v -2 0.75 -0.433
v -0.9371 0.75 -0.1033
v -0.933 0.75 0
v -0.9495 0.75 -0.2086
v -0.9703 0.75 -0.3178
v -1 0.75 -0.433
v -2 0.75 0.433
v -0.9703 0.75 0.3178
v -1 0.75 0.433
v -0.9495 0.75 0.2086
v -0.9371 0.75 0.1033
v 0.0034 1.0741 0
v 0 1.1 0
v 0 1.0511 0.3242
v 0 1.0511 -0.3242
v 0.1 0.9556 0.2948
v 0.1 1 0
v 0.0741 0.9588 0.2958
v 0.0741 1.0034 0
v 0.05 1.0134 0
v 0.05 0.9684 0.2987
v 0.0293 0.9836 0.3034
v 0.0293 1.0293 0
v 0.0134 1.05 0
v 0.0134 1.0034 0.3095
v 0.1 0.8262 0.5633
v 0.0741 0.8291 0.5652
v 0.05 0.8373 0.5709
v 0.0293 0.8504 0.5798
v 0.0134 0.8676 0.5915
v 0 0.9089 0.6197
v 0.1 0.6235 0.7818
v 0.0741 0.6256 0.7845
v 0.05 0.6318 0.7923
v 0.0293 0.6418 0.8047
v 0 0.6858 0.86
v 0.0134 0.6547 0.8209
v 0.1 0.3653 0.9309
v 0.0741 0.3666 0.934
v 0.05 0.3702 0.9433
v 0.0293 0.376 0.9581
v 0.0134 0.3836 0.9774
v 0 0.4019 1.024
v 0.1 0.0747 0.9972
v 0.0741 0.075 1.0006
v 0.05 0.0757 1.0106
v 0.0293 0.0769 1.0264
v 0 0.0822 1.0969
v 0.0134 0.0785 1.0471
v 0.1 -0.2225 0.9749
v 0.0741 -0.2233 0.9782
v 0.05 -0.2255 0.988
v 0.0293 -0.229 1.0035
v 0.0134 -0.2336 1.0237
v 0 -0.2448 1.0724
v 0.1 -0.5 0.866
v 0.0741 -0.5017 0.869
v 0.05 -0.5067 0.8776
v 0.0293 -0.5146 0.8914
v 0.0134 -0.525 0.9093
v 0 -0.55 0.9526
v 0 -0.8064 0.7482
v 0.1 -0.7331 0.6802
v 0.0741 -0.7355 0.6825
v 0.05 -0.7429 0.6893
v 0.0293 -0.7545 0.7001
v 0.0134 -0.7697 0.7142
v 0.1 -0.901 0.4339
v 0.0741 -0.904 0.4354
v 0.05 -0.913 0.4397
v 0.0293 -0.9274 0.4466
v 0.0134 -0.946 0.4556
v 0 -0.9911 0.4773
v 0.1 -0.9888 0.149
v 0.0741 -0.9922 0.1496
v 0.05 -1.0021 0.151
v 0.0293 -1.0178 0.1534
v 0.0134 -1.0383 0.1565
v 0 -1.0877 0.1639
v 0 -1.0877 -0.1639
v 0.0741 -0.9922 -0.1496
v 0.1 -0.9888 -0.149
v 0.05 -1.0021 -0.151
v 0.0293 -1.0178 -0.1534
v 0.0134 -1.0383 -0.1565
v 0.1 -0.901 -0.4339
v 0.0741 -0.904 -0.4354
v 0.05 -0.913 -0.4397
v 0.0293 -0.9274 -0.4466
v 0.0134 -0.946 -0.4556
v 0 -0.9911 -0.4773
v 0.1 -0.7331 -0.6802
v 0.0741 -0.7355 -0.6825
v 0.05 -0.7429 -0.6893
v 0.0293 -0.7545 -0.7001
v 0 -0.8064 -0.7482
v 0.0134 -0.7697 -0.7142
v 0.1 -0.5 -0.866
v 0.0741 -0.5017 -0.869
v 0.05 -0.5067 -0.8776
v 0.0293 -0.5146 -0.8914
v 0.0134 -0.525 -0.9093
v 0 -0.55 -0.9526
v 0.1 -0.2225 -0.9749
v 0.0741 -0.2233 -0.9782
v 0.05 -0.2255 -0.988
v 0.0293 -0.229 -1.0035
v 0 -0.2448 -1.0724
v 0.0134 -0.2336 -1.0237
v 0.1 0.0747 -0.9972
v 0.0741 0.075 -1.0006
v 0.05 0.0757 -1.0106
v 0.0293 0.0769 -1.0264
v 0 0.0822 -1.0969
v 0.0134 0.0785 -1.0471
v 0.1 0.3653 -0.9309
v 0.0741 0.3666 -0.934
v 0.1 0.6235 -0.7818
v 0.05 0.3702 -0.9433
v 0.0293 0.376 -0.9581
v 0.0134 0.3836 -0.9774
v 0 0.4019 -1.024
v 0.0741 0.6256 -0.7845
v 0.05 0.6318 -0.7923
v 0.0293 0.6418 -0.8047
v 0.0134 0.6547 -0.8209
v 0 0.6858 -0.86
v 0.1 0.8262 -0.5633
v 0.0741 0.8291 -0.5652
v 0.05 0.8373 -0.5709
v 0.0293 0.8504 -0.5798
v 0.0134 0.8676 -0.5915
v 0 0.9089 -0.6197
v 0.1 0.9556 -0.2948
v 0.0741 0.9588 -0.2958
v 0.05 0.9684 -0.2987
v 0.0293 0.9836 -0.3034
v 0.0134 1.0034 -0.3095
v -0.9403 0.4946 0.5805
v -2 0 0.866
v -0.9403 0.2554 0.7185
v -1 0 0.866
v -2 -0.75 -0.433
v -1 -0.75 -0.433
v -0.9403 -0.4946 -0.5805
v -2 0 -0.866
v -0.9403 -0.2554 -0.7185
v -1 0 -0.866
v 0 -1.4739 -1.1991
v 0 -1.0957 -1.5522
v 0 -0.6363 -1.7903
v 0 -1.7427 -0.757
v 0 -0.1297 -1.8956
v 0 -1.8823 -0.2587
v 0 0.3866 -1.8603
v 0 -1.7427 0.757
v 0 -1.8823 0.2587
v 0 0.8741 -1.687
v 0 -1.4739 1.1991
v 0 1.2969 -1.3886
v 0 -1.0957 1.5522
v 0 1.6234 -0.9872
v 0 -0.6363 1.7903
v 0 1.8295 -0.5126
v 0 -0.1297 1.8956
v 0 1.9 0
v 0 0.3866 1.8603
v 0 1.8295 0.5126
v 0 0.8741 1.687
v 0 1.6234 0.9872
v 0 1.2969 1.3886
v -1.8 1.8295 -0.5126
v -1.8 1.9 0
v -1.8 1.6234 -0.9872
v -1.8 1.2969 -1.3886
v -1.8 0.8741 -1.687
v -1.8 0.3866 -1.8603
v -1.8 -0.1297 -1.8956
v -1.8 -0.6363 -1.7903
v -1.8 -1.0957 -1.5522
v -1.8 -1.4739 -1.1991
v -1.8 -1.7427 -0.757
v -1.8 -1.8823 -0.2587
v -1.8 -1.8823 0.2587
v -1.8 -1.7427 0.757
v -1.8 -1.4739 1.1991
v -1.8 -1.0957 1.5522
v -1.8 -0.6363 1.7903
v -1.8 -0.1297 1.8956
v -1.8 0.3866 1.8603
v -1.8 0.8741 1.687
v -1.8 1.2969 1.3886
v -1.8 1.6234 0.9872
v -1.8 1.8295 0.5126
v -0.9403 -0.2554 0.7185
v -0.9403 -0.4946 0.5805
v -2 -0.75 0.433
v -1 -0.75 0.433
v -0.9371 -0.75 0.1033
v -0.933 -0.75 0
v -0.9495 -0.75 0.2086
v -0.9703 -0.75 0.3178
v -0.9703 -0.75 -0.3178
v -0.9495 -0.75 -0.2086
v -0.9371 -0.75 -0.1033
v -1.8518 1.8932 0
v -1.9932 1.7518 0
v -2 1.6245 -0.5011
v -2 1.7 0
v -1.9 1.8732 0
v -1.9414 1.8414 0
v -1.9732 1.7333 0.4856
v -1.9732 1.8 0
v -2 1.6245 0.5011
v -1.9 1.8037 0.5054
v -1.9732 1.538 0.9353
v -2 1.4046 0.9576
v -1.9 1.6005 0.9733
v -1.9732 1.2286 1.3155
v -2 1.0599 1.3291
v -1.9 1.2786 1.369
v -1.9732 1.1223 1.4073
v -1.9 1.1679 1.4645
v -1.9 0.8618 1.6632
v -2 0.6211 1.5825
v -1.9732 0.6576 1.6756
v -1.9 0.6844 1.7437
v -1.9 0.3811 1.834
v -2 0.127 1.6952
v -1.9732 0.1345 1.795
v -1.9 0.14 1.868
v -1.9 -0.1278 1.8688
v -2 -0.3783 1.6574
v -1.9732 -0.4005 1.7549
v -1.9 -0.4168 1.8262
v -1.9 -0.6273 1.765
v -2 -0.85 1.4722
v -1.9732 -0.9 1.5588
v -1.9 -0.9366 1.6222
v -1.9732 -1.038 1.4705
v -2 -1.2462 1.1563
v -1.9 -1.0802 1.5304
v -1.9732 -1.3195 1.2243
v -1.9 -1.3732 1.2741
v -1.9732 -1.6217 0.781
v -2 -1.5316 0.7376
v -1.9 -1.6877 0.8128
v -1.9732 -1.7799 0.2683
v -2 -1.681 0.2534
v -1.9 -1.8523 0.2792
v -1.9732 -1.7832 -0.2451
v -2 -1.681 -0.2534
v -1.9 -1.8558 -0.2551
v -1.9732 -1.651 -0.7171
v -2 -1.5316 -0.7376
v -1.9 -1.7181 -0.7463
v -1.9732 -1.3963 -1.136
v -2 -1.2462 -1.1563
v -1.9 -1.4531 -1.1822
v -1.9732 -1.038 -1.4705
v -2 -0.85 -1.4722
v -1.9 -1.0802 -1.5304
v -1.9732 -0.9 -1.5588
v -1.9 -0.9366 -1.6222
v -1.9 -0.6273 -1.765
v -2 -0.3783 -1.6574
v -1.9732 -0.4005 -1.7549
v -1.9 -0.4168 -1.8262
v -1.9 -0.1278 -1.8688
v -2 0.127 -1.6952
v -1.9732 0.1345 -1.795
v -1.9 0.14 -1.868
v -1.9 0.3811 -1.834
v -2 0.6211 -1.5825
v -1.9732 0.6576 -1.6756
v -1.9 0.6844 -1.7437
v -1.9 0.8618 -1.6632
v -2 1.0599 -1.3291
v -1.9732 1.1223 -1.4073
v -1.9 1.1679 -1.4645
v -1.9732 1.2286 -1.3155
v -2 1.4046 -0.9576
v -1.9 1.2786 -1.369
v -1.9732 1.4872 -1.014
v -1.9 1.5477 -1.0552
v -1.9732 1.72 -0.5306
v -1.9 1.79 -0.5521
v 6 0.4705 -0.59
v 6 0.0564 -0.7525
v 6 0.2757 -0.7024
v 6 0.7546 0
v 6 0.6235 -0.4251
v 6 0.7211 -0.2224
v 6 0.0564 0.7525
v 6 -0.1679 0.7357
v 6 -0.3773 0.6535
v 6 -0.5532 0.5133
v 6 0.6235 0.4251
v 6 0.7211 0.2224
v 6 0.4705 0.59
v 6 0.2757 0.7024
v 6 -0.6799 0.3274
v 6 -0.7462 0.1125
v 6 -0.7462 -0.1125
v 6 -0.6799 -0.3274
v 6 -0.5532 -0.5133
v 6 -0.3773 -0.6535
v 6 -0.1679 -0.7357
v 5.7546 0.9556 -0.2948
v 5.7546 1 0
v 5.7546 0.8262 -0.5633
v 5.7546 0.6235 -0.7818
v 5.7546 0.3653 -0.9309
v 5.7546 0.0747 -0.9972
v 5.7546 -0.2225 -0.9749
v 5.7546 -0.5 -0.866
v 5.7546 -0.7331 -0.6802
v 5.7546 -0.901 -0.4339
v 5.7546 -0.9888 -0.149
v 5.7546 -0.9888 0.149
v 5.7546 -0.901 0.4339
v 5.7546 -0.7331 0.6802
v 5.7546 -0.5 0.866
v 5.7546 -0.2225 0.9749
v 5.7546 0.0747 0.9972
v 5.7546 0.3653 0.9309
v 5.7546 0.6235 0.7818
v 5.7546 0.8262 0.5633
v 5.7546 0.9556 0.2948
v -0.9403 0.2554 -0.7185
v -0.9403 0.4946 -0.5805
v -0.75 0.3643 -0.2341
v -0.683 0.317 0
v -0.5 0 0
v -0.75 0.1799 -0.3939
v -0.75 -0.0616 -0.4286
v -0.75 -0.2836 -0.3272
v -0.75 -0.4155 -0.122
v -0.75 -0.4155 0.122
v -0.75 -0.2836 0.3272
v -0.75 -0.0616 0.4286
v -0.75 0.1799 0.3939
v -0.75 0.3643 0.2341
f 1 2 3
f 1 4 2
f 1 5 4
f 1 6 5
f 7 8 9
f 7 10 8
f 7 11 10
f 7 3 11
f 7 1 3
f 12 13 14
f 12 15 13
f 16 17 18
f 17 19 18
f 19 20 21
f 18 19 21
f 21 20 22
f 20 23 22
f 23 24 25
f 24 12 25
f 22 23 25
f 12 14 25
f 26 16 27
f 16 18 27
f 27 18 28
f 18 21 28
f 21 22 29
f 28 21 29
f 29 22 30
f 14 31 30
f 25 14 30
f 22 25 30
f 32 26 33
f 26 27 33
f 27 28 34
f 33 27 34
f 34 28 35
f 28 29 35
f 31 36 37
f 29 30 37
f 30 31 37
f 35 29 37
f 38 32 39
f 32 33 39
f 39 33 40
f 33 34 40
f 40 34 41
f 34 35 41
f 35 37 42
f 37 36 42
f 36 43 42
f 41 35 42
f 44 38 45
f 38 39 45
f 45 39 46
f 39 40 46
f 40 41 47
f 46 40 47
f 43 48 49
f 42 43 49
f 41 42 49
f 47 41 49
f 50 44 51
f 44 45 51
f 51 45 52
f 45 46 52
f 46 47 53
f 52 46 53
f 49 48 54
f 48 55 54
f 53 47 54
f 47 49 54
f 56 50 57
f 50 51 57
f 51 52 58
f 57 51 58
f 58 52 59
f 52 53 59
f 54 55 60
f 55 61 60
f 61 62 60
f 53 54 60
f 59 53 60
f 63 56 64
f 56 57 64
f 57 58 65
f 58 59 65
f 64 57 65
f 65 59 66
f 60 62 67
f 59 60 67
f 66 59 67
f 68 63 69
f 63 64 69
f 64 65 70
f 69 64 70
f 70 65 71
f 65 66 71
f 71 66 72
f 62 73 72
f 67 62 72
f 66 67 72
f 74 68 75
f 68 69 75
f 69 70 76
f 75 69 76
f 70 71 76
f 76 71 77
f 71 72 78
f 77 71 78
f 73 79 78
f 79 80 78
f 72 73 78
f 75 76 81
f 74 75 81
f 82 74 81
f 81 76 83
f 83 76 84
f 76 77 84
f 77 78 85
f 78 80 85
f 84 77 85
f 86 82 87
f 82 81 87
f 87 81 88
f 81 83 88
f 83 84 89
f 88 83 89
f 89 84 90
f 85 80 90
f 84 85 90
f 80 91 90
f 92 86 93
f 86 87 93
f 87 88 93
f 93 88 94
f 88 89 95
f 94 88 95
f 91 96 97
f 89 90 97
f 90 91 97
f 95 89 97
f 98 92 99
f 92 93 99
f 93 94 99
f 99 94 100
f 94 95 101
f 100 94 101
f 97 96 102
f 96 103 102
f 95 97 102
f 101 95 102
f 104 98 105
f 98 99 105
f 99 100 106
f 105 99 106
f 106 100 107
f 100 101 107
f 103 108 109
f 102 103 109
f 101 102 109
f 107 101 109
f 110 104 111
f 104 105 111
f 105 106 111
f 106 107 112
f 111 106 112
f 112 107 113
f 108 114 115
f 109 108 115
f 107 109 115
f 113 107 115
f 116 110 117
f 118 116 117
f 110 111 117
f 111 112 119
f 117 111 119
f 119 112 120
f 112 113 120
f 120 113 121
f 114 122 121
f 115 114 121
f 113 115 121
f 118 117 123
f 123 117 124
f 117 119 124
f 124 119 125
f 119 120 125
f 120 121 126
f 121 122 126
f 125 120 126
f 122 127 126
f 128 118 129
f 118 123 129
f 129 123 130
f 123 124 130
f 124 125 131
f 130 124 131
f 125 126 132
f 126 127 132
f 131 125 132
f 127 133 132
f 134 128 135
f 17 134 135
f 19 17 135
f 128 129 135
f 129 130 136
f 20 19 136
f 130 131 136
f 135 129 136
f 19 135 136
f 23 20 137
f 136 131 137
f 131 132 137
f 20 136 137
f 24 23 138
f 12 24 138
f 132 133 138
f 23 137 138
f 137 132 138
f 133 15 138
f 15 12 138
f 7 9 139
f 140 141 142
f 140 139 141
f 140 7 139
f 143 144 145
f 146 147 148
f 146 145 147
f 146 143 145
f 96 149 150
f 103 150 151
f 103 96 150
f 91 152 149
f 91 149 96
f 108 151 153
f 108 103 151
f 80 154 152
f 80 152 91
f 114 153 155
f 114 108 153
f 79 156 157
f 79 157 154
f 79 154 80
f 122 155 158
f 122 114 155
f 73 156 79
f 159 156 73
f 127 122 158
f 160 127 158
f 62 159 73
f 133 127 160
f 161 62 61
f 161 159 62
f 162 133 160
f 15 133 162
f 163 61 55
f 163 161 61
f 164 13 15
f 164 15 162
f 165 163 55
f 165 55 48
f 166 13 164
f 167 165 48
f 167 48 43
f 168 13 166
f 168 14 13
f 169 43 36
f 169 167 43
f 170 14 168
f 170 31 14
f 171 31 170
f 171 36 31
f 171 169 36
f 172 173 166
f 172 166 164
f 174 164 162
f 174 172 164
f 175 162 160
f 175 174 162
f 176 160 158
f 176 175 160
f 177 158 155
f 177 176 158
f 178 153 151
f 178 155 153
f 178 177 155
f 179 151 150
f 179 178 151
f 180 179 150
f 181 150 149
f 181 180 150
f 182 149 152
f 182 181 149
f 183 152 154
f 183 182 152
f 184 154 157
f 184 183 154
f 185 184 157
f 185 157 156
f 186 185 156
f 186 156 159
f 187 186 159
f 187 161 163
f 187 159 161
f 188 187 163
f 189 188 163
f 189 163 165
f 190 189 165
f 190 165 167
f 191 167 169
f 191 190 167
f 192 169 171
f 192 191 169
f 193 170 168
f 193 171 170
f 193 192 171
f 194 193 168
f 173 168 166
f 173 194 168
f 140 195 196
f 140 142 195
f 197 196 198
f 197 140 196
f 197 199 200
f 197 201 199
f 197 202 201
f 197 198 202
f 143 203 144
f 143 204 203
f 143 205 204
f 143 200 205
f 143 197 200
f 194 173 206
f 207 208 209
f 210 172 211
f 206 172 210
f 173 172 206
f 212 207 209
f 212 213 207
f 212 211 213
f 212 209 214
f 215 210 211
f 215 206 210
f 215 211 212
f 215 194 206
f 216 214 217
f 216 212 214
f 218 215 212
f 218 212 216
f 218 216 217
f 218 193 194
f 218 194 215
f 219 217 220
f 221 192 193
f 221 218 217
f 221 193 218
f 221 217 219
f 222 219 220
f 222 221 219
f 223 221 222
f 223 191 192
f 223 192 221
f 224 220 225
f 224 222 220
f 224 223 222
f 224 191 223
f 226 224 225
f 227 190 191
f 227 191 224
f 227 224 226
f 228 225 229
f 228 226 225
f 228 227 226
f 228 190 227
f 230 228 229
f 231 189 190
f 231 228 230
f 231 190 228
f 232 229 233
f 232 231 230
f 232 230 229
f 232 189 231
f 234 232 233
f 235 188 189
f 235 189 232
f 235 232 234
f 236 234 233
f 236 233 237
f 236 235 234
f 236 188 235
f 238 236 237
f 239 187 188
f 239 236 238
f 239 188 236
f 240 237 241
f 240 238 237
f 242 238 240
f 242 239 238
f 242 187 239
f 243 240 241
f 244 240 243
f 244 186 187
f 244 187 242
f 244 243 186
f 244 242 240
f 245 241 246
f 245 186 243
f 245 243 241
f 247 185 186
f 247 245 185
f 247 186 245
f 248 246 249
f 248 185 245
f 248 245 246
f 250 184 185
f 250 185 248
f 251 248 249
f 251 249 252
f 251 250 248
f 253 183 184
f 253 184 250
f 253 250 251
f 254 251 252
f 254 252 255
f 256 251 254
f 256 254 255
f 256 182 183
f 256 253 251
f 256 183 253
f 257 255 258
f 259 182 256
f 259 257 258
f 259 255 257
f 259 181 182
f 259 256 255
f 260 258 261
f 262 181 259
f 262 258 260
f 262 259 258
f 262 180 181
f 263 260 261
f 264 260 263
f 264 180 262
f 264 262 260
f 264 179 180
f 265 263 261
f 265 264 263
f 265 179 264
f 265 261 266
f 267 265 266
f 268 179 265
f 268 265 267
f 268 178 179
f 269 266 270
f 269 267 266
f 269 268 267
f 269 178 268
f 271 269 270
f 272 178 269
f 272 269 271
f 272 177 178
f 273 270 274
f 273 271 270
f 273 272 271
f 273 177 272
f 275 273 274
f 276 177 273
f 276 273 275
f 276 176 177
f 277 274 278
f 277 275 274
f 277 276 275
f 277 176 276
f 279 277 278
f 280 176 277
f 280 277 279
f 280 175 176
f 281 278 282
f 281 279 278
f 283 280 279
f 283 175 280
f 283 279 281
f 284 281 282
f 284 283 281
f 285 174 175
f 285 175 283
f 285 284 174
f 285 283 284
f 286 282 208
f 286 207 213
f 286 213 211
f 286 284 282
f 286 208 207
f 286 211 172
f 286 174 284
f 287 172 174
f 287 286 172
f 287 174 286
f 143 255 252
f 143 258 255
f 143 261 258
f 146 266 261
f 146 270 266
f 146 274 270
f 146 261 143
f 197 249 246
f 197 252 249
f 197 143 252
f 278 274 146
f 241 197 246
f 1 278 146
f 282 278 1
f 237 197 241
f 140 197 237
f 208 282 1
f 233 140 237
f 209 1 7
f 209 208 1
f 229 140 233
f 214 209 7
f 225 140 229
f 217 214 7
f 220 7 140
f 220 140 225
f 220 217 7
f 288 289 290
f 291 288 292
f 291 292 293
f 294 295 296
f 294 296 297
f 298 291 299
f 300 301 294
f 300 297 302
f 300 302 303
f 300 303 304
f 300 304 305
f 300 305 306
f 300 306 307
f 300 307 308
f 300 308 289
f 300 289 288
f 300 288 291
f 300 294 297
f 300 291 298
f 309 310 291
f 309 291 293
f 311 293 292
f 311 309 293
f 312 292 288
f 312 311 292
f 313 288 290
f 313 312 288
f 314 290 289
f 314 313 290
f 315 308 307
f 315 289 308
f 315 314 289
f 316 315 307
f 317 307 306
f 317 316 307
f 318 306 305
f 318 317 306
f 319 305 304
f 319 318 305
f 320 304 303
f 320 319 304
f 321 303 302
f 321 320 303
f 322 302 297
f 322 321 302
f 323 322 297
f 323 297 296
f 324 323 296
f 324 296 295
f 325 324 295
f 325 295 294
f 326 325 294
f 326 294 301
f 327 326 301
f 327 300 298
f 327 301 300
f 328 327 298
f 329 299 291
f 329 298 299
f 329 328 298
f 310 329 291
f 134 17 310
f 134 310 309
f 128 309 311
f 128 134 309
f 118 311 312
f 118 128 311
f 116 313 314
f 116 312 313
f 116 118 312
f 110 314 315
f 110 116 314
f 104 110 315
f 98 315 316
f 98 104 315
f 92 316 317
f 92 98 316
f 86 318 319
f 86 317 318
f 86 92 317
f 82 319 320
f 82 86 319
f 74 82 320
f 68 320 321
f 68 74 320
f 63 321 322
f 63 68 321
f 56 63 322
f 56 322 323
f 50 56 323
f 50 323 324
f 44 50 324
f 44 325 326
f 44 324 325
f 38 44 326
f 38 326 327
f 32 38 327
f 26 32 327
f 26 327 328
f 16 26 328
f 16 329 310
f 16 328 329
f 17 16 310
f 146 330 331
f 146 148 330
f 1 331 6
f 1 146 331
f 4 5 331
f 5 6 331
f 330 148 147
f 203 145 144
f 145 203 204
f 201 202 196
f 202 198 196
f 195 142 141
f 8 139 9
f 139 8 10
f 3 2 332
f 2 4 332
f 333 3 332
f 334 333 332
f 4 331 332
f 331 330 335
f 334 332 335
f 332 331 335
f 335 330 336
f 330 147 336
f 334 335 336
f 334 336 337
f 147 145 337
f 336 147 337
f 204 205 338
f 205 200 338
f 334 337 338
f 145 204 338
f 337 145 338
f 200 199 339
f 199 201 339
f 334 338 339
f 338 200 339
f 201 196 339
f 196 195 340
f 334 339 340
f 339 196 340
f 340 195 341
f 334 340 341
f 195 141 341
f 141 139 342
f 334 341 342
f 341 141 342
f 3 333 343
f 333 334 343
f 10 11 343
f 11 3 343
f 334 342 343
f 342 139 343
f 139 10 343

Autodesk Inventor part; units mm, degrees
ref_plane "YZ Plane" through (0, 0, 0) normal (1, 0, 0) x (0, 1, 0)
ref_plane "XZ Plane" through (0, 0, 0) normal (0, 1, 0) x (-1, 0, 0)
sketch "Sketch1" plane through (0, 0, 0) normal (0, 0, 1) x (1, 0, 0)
  line L0 (-0.5, 0) -> (6, 0)
  line L1 (6, 0) -> (6, 1)
  line L2 (6, 1) -> (1, 1)
  line L3 (1, 1) -> (0.7545, 1)
  line L4 (0.7545, 1) -> (0, 1)
  line L5 (0, 1) -> (0, 1.9)
  line L6 (0, 1.9) -> (-2, 1.9)
  line L7 (-2, 1.9) -> (-2, 0.866)
  line L8 (-2, 0.866) -> (-1, 0.866)
  line L9 (-1, 0.866) -> (-0.5, 0)
  line L10 (-3.6, 0) -> (7.6, 0) projected
  line L11 (0, -0.38) -> (0, 2.28) projected
  line L12 (1, 1) -> (0, 1) construction
  dimension "d1" = 5
  dimension "d2" = 0.2455
  dimension "d3" = 2
  dimension "d4" = 1
  dimension "d5" = 60
  dimension "d6" = 2
  dimension "d7" = 2
  dimension "d8" = 1.7321
  dimension "d9" = 3.8
  dimension "d26" = 6
revolve "Body" add sketch "Sketch1" angle 360 about axis through (-0.5, 0, 0) along (1, 0, 0)
sketch "Sketch2" plane through (-2, 0, 0) normal (-1, 0, 0) x (0, 0, 1)
  circle A0 centre (0, 0) radius 0.866 projected
  line L0 (0, -2.66) -> (0, 2.66) projected
  line L1 (-2.66, 0) -> (2.66, 0) projected
  line L2 (0.866, 0) -> (0.433, -0.75)
  line L3 (0.433, -0.75) -> (-0.433, -0.75)
  line L4 (-0.433, -0.75) -> (-0.866, 0)
  line L5 (-0.866, 0) -> (-0.433, 0.75)
  line L6 (-0.433, 0.75) -> (0.433, 0.75)
  line L7 (0.433, 0.75) -> (0.866, 0)
  point P0 (0, 0)
extrude "Slot" add sketch "Sketch2" against normal up to next contours L7 A0 | A0 L2 | L6 L0 A0 | A0 L0 L3 | L0 L6 A0 | A0 L3 L0 | L4 A0 | A0 L5
fillet "Fillet1" radius 0.2 1 edges at (-2, -1.9, 0)
thread "Thread" size "M2x0.4" class "6g" standard "ISO Metric profile" length 5
chamfer "Chamfer1" distance 0.2454 distance2 0.2454 1 edges at (6, -1, 0) measured on face at (6, -0.4588, -0.3309)
ref_plane "Work Plane1" through (29, 0, 0) normal (0, -1, 0) x (1, 0, 0)
fillet "Fillet2" radius 0.1 1 edges at (0, -1, 0)
equation "\"d1\" = GEL"
equation "\"d3\" = KOH"
equation "\"d4\" = INTI"
equation "\"d6\" = GD"
equation "\"d7\" = BDM"
equation "\"d8\" = 1.1547 * SW"
equation "\"d9\" = KOD"
equation "\"d26\" = NLG"
equation "\"d30\" = R"
equation "\"d17\" = RR"
equation "\"d13\" = GEL"
equation "\"d15\" = -0.5 * SPD + 0.5 * GD"
equation "\"d16\" = GUL"
equation "\"GD\" = 2"
equation "\"NLG\" = 6"
equation "\"GEL\" = 5"
equation "\"KOD\" = 3.8"
equation "\"KOH\" = 2"
equation "\"INTI\" = 1"
equation "\"GAL\" = 0.61345 * PTC"
equation "\"GUL\" = 0.61345 * PTC"
equation "\"BDM\" = NND"
equation "\"SW\" = 1.5"
equation "\"RR\" = 0.2"
equation "\"SPD\" = NND - 1.2269 * PTC"
equation "\"R\" = 0.1"
equation "\"TOA\" = 30deg"
equation "\"GD1\" = THREADDIA - 1.2269 * PTC"
equation "\"THREADDIA\" = 2"
equation "\"FAWI\" = 45deg"
equation "\"PTC\" = 0.4"
equation "\"NND\" = 2"
equation "\"E0\" = 1.155 * SW"
properties part number "ISO 4762 - M2 x 6" material "Stainless Steel, 440C"
